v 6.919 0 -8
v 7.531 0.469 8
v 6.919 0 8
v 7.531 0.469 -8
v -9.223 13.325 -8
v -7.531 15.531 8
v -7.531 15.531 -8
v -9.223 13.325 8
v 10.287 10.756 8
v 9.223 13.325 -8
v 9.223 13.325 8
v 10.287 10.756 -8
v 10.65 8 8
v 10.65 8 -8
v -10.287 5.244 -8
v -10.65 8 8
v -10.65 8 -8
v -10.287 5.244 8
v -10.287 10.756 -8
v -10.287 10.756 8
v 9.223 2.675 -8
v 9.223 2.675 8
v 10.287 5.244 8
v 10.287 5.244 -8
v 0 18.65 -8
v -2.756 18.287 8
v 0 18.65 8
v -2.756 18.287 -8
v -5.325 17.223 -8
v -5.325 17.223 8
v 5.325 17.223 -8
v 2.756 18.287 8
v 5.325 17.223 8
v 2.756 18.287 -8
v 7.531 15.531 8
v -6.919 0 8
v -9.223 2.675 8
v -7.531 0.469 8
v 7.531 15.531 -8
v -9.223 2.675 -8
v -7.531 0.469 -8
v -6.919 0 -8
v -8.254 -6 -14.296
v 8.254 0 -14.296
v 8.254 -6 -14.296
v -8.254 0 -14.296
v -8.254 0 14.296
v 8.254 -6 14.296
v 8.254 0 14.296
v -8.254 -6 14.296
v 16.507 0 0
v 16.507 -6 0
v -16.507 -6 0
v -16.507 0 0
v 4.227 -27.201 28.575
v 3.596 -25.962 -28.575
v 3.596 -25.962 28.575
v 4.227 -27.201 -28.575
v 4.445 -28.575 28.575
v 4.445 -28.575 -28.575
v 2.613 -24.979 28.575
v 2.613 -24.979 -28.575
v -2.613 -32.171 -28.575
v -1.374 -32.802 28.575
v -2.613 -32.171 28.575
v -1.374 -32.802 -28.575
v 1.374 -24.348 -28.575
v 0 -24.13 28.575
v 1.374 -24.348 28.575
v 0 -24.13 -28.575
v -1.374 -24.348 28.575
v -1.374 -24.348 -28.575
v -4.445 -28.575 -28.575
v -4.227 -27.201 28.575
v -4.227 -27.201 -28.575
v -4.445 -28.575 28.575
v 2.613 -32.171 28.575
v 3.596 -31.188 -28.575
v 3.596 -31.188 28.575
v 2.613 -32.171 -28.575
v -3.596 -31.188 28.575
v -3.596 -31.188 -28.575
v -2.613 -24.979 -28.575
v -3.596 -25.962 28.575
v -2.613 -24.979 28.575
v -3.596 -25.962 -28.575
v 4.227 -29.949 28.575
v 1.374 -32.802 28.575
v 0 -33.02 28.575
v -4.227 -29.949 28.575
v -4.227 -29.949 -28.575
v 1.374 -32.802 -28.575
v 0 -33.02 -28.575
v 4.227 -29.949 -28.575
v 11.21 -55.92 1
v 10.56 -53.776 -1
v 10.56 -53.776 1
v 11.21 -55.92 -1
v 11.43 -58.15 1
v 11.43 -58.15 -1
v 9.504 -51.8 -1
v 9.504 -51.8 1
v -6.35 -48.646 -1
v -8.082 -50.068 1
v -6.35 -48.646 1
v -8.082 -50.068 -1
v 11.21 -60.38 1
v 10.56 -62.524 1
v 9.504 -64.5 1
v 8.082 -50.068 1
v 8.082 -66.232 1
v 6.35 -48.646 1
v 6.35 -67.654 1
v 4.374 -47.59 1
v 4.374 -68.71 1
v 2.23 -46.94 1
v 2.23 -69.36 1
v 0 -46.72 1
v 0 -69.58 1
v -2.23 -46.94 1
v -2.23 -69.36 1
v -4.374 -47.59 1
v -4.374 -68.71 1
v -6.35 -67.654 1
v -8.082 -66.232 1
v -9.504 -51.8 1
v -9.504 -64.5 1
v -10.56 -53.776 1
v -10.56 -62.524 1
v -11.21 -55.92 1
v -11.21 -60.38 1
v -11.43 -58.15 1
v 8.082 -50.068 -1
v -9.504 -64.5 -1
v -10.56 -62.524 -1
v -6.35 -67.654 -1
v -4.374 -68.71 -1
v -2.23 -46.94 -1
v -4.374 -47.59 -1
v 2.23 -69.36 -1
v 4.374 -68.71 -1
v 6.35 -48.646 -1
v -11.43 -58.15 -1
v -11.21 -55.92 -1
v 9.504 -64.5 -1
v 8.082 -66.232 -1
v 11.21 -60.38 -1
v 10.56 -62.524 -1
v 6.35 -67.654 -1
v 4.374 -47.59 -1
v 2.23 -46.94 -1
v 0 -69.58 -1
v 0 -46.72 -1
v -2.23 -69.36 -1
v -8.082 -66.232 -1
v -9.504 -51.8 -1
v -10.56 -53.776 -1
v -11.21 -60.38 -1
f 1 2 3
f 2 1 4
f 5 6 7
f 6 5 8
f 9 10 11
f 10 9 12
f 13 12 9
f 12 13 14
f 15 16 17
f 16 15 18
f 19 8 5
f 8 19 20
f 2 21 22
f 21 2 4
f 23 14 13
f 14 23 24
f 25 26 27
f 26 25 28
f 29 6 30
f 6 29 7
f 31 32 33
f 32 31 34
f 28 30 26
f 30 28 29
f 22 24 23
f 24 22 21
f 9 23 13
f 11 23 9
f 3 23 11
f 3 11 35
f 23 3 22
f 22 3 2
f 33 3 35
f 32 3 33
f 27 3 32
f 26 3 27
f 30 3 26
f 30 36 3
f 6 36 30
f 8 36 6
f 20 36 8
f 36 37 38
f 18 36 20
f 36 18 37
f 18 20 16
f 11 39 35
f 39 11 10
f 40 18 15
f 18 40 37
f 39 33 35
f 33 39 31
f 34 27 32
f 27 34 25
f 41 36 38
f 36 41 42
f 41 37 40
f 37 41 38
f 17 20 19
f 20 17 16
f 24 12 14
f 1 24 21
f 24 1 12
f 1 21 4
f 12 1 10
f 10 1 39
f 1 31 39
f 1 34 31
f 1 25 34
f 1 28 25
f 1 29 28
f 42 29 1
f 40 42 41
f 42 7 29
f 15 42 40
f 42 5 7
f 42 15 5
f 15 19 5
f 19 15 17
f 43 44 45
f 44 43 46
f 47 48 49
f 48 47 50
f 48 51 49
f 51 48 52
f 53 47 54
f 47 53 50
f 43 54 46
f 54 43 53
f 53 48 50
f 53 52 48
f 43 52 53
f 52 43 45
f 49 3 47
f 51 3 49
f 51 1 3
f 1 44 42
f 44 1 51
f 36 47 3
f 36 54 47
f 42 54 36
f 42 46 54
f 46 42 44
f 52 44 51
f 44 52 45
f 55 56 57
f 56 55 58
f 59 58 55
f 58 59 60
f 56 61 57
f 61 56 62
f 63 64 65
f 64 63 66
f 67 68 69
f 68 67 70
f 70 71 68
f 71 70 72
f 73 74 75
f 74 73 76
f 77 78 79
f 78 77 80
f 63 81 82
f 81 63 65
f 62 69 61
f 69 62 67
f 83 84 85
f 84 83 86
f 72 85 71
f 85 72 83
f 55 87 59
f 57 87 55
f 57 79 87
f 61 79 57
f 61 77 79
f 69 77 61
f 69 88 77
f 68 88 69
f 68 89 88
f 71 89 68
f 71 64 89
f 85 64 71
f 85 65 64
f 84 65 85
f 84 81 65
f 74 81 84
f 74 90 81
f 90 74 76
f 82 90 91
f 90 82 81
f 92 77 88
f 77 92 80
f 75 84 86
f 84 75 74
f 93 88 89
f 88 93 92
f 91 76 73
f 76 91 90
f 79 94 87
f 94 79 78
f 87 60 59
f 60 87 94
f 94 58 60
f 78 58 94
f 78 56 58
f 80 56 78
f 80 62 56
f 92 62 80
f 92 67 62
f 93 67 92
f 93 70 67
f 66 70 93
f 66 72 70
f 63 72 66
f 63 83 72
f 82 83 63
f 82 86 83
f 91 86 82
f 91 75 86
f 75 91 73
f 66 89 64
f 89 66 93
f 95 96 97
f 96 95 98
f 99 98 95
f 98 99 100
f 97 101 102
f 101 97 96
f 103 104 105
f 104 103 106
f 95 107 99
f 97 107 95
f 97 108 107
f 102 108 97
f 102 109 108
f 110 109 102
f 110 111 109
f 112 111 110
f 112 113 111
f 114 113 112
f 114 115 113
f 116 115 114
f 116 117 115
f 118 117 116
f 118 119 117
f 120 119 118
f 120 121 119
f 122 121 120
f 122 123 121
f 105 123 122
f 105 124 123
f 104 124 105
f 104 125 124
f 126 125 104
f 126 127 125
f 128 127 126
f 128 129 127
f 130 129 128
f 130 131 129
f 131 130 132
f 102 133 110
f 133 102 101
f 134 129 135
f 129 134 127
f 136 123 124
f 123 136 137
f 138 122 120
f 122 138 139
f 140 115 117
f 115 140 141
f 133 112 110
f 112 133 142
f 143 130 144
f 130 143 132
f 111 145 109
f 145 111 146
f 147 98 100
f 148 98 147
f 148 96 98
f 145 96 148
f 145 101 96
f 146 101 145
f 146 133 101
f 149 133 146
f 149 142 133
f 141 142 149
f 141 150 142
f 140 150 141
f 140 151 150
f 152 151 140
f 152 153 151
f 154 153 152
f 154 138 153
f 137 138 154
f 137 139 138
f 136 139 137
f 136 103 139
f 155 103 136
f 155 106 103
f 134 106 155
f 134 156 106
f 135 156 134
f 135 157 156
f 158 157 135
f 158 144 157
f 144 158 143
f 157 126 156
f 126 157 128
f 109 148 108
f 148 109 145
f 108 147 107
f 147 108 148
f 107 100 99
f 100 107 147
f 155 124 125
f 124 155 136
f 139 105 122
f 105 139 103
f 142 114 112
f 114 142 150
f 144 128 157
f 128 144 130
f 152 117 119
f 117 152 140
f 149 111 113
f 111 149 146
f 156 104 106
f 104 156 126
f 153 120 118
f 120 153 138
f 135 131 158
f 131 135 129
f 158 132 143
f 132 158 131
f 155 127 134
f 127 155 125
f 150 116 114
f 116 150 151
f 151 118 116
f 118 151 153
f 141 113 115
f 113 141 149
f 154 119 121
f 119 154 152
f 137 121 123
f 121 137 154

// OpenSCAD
// Auto-generated by scripts/author_from_manifest.py (Phase D.3).
// Source: data/phase_d_manifest.json (sku_intent='viking-vk200-pendent-200f').
// Do not hand-edit — regenerate from the manifest.
//
// @part viking_vk200_pendent_200f
// @kind sprinkler_head
// @category head.pendant.k56
// @display-name "Viking VK200 Pendent K5.6 SR 200°F"
// @mfg viking_group
// @mfg-pn VK200
// @listing UL FM
// @hazard-classes LH OH1
// @price-usd 13.10
// @install-minutes 8
// @crew journeyman
// @k-factor 5.6
// @orientation pendant
// @response standard
// @temperature 200F
// @param size_in number default=0.5 label="Size" unit="in"
// @port inlet position=[0,0.014,0] direction=[0,1,0] style=NPT_threaded size_in=0.5 role=drop

size_in = 0.5;
k_factor = 5.6;

length_mm   = 57.15;
body_dia_mm = 25.40;
thread_od   = 21.3;
thread_len  = 16;
deflector_d = body_dia_mm * 0.9;

 union() {
    translate([0, thread_len/2, 0])
        cylinder(h = thread_len, d = thread_od, center = true, $fn = 24);
    translate([0, -3, 0])
        rotate([90, 0, 0])
        cylinder(h = 6, d = thread_od * 1.55, $fn = 6, center = true);
    translate([0, -length_mm/2, 0])
        cylinder(h = length_mm, d = body_dia_mm * 0.35, center = true, $fn = 20);
    translate([0, -length_mm - 1, 0])
        cylinder(h = 2, d = deflector_d, center = true, $fn = 32);
}
